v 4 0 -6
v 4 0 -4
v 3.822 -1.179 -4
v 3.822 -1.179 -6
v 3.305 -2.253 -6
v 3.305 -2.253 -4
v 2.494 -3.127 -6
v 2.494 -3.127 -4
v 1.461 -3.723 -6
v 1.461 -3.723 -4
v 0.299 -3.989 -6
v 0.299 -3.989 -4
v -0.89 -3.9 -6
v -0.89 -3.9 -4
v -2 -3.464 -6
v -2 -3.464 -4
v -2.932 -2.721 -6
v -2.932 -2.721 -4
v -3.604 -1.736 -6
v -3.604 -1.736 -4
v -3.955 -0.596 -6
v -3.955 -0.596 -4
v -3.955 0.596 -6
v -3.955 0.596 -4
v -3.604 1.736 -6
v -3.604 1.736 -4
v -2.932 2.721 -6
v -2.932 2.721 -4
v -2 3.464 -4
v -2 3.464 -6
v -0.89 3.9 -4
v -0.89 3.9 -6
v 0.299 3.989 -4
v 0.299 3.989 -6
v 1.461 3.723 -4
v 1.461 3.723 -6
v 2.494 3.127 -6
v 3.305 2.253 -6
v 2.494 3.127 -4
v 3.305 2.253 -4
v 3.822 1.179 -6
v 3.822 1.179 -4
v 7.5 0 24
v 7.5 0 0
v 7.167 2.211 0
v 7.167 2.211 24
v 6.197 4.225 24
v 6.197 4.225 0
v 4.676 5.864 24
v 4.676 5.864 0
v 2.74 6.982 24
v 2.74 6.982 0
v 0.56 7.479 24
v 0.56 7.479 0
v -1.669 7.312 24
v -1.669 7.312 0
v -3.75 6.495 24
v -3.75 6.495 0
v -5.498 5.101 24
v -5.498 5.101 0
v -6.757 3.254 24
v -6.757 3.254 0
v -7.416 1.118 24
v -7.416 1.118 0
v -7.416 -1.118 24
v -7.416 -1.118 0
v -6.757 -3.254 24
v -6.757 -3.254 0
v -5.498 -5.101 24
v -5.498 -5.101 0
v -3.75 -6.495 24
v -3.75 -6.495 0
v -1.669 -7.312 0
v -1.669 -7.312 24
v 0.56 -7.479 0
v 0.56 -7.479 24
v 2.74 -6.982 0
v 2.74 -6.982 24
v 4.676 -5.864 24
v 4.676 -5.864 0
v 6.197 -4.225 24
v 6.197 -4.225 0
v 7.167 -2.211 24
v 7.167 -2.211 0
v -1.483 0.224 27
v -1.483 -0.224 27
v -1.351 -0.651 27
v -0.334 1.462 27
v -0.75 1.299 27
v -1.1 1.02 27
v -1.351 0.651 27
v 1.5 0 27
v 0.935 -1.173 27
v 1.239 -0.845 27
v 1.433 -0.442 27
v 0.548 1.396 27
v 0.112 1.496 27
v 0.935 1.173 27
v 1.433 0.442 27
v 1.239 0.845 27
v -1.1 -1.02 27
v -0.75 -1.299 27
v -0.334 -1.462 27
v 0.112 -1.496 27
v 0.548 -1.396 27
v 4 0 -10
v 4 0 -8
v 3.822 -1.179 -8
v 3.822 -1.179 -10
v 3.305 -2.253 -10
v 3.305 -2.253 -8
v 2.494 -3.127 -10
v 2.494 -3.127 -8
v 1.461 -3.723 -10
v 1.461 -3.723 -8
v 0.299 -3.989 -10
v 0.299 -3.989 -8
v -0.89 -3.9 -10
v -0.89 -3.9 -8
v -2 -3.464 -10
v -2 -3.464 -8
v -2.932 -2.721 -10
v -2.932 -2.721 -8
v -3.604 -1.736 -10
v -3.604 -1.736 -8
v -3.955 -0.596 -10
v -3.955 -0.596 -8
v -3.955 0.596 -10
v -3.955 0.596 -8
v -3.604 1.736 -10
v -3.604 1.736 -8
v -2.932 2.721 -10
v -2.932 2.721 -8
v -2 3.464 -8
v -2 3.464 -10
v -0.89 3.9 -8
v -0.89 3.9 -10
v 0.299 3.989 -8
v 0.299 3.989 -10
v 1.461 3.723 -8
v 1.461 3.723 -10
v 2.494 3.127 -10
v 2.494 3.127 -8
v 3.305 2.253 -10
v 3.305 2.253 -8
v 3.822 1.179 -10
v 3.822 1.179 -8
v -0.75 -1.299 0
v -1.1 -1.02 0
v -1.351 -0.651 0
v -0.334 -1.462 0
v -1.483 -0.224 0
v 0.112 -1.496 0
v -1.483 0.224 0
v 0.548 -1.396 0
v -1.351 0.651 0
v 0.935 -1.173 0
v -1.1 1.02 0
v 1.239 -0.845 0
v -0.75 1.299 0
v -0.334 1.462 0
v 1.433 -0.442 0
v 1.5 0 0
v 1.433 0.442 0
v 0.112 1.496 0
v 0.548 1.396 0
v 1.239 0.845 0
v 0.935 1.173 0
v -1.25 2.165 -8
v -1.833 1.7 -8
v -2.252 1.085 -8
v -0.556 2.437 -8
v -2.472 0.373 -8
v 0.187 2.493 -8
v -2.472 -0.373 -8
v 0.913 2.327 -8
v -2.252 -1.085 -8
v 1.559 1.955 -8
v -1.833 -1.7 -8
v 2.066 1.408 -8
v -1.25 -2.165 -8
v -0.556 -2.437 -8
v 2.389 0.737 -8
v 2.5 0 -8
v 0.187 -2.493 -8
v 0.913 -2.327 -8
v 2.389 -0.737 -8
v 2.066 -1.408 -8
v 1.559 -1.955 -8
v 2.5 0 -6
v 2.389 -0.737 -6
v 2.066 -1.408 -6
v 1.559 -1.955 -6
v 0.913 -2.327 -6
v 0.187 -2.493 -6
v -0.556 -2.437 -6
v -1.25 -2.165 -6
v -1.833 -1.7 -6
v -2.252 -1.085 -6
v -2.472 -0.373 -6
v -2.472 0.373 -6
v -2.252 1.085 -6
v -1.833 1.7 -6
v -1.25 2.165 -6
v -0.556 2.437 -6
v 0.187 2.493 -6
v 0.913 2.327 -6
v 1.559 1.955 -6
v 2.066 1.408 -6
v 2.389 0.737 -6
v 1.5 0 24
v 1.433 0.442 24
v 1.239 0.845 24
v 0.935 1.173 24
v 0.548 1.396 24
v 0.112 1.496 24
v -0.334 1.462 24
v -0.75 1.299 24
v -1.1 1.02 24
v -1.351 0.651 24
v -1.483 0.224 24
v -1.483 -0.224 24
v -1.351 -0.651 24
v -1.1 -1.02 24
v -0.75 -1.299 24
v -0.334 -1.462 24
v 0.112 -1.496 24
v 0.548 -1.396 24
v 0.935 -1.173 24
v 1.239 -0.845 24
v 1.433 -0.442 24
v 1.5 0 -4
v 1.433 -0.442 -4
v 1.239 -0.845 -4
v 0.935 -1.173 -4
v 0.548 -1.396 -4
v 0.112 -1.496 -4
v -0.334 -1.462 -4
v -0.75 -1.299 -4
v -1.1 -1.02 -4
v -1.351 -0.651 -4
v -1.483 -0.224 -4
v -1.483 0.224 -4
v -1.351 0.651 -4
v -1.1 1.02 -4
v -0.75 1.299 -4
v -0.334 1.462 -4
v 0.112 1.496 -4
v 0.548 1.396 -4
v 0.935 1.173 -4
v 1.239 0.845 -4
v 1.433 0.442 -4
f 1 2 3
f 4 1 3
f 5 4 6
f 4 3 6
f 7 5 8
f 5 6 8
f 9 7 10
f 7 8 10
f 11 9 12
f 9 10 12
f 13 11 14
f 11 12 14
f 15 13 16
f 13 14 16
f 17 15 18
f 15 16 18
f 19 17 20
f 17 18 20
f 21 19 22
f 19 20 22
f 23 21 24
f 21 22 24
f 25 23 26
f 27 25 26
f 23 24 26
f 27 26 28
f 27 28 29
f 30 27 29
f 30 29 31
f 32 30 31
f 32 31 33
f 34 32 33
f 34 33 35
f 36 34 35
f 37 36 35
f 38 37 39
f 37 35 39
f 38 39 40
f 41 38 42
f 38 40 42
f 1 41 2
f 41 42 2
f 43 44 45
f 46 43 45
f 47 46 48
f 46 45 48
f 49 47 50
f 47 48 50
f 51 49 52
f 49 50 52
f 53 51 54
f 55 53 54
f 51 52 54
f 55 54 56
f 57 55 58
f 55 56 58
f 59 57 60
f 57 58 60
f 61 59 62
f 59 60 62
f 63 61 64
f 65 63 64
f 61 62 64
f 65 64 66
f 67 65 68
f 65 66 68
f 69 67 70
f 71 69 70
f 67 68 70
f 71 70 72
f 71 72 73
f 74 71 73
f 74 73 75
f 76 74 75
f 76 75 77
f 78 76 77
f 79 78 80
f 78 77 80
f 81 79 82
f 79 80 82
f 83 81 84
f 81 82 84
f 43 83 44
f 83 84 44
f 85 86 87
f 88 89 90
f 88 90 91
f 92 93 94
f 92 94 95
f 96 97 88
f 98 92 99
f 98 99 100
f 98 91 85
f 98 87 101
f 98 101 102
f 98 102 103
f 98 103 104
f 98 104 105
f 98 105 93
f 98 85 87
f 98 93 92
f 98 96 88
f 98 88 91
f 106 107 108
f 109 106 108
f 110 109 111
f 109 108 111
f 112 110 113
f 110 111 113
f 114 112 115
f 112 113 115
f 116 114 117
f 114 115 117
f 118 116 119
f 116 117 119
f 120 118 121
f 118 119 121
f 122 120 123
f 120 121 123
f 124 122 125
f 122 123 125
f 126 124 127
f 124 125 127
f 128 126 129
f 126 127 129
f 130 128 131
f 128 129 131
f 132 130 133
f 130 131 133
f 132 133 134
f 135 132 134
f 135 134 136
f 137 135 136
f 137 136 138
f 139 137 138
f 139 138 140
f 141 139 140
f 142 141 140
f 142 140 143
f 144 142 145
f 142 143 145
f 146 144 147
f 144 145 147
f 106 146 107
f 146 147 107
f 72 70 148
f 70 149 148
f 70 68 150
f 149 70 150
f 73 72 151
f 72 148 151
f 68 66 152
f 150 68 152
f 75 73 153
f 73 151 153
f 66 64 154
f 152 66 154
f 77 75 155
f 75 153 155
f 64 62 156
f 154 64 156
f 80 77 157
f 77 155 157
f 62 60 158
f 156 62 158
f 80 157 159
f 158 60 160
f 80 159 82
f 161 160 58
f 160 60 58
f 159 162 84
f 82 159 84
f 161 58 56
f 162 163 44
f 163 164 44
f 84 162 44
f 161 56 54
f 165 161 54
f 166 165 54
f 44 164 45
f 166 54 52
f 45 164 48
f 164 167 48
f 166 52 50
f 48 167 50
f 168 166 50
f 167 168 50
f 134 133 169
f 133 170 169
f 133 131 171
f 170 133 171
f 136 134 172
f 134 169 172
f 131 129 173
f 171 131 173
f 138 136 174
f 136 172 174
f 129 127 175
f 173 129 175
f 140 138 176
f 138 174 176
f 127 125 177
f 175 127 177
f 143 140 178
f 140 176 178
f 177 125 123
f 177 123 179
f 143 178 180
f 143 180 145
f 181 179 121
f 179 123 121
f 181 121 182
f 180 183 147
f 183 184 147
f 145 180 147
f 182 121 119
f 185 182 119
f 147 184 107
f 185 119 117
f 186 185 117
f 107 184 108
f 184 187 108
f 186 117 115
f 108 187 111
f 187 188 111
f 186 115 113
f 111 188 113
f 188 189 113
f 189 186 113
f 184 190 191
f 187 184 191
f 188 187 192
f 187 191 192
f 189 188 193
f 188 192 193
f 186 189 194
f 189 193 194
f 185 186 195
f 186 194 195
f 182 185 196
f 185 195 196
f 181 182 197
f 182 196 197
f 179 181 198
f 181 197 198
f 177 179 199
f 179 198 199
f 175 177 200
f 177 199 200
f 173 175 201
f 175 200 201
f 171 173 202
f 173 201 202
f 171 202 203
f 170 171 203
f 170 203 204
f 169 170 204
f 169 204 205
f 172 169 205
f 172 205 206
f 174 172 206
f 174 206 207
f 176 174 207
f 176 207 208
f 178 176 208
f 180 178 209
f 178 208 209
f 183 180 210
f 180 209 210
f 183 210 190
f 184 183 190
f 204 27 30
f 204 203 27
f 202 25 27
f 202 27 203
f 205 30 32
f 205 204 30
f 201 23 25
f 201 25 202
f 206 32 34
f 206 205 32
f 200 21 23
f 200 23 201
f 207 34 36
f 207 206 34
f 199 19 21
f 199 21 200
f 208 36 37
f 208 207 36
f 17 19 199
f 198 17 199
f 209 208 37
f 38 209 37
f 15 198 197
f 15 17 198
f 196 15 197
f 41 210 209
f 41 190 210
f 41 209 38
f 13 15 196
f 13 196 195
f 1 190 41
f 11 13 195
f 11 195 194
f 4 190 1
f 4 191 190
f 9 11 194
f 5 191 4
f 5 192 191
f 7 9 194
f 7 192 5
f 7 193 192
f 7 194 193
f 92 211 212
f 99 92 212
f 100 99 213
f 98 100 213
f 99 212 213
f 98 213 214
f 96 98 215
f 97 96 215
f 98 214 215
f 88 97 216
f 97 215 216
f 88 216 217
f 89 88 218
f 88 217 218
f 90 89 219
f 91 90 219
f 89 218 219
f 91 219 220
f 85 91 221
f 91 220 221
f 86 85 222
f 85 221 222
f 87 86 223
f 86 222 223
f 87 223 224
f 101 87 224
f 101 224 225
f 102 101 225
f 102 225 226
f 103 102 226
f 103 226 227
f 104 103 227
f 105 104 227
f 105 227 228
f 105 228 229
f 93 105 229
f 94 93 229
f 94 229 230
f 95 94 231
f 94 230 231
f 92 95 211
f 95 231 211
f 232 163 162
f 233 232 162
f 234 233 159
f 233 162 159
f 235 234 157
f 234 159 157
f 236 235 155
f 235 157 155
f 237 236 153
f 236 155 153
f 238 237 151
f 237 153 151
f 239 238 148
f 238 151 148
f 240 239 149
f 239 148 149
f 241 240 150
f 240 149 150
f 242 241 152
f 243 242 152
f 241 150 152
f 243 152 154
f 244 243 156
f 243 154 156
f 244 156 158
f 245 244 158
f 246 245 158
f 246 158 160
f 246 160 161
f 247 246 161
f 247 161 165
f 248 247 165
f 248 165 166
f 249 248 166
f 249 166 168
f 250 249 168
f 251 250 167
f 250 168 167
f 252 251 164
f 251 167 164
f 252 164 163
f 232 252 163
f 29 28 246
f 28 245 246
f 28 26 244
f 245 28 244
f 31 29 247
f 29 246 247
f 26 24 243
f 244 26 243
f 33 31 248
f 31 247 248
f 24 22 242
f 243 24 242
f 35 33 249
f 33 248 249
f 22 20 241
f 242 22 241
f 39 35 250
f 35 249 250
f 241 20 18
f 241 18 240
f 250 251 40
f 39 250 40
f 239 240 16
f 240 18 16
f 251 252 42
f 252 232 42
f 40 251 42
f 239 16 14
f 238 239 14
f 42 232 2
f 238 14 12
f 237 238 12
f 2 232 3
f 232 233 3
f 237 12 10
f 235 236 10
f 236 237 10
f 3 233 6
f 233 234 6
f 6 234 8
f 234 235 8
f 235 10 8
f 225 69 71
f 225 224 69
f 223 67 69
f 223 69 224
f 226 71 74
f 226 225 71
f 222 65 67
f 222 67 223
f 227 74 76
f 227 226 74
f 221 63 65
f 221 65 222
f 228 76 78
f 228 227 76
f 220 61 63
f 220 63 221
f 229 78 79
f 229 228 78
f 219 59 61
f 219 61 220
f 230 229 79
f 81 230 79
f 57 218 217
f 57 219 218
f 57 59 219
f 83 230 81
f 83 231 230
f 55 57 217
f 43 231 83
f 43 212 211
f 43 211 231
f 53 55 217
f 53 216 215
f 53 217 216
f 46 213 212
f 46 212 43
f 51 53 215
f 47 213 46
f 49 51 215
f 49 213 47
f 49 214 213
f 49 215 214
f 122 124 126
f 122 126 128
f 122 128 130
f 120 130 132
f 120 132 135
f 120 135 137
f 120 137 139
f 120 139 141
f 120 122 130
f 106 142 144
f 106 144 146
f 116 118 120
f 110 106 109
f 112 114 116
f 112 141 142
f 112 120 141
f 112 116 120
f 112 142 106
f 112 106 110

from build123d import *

# Parameters (mm, degrees)
SKETCH_R     = 7.5
PAD_DEPTH    = 24
SKETCH001_R  = 1.5
PAD001_DEPTH = 3
SKETCH002_R  = 1.5
PAD002_DEPTH = 4
SKETCH003_R  = 4
PAD003_DEPTH = 2
SKETCH004_R  = 2.5
PAD004_DEPTH = 2
SKETCH005_R  = 4
PAD005_DEPTH = 2


with BuildPart() as part:
    # Sketch → Pad (new body)
    with BuildSketch(Plane.XY):
        Circle(SKETCH_R)
    extrude(amount=PAD_DEPTH)

    # Sketch001 → Pad001 (new body)
    with BuildSketch(Plane.XY.offset(24)):
        Circle(SKETCH001_R)
    extrude(amount=PAD001_DEPTH)

    # Sketch002 → Pad002 (new body)
    with BuildSketch(Plane(origin=(0, 0, 0), x_dir=(1, 0, 0), z_dir=(0, 0, -1))):
        Circle(SKETCH002_R)
    extrude(amount=PAD002_DEPTH)

    # Sketch003 → Pad003 (new body)
    with BuildSketch(Plane(origin=(0, 0, -4), x_dir=(1, 0, 0), z_dir=(0, 0, -1))):
        Circle(SKETCH003_R)
    extrude(amount=PAD003_DEPTH)

    # Sketch004 → Pad004 (new body)
    with BuildSketch(Plane(origin=(0, 0, -6), x_dir=(1, 0, 0), z_dir=(0, 0, -1))):
        Circle(SKETCH004_R)
    extrude(amount=PAD004_DEPTH)

    # Sketch005 → Pad005 (new body)
    with BuildSketch(Plane(origin=(0, 0, -8), x_dir=(1, 0, 0), z_dir=(0, 0, -1))):
        Circle(SKETCH005_R)
    extrude(amount=PAD005_DEPTH)


solid = part.part
